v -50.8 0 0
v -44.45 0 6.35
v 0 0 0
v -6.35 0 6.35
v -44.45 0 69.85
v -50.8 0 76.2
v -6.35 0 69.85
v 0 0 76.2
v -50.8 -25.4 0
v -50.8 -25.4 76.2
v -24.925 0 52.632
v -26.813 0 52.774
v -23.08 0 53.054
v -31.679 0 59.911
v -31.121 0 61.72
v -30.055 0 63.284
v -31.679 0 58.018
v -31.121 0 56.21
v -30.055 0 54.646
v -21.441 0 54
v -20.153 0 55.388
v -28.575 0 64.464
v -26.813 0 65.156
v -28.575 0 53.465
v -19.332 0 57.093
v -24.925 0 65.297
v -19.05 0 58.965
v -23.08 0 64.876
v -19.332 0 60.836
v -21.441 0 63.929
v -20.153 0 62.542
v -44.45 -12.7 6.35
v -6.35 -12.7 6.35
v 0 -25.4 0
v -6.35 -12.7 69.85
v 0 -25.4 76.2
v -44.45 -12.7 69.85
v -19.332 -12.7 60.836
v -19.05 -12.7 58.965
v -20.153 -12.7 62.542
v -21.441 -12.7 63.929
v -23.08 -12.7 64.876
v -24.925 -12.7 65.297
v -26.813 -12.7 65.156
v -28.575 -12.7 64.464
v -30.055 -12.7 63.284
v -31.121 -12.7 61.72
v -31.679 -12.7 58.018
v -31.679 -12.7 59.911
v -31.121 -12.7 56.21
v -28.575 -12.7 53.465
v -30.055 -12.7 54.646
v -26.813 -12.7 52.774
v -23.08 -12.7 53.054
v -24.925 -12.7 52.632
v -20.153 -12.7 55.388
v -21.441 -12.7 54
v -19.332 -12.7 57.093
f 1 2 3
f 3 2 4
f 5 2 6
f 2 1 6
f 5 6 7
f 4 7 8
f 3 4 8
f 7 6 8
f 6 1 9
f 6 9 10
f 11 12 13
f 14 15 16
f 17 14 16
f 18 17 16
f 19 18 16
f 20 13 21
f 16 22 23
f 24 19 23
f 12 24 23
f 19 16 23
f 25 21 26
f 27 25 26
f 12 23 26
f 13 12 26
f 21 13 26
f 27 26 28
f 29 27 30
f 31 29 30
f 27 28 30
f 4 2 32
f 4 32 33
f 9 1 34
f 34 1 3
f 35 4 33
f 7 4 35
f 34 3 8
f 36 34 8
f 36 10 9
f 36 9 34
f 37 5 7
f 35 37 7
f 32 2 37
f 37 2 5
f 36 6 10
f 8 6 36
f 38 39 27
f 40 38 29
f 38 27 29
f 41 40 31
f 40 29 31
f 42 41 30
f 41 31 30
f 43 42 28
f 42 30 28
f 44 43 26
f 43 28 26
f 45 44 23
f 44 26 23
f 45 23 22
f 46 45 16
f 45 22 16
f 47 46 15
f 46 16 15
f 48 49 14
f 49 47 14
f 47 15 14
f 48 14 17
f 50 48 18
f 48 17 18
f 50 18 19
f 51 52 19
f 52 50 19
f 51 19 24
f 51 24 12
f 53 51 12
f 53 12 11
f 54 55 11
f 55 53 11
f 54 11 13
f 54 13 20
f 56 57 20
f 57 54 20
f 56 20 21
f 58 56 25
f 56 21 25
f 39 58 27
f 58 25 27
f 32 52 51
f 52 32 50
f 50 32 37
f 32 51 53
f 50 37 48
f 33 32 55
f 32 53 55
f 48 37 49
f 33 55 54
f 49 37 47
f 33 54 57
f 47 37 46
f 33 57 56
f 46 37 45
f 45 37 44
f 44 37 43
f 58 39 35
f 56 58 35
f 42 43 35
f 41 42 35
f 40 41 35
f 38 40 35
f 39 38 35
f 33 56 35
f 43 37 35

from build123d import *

# Parameters (mm, degrees)
F0_W     = 50.8
F0_H     = 76.2
F1_DEPTH = 25.4
F2_W     = 38.1
F2_H     = 63.5
F3_DEPTH = 12.7
F4_R     = 6.35
F5_DEPTH = 25.4


with BuildPart() as f1:
    # F0 (on Front) → F1 (new body)
    with BuildSketch(Plane.XZ):
        with Locations((-25.4, 38.1)):
            Rectangle(F0_W, F0_H)
    extrude(amount=F1_DEPTH)

    # F2 (on Front) → F3 (cut)
    with BuildSketch(Plane.XZ):
        with Locations((-25.4, 38.1)):
            Rectangle(F2_W, F2_H)
    extrude(amount=F3_DEPTH, mode=Mode.SUBTRACT)

    # F4 (on Front) → F5 (join)
    with BuildSketch(Plane.XZ):
        with Locations((-25.4, 58.964718)):
            Circle(F4_R)
    extrude(amount=F5_DEPTH)


solid = f1.part
